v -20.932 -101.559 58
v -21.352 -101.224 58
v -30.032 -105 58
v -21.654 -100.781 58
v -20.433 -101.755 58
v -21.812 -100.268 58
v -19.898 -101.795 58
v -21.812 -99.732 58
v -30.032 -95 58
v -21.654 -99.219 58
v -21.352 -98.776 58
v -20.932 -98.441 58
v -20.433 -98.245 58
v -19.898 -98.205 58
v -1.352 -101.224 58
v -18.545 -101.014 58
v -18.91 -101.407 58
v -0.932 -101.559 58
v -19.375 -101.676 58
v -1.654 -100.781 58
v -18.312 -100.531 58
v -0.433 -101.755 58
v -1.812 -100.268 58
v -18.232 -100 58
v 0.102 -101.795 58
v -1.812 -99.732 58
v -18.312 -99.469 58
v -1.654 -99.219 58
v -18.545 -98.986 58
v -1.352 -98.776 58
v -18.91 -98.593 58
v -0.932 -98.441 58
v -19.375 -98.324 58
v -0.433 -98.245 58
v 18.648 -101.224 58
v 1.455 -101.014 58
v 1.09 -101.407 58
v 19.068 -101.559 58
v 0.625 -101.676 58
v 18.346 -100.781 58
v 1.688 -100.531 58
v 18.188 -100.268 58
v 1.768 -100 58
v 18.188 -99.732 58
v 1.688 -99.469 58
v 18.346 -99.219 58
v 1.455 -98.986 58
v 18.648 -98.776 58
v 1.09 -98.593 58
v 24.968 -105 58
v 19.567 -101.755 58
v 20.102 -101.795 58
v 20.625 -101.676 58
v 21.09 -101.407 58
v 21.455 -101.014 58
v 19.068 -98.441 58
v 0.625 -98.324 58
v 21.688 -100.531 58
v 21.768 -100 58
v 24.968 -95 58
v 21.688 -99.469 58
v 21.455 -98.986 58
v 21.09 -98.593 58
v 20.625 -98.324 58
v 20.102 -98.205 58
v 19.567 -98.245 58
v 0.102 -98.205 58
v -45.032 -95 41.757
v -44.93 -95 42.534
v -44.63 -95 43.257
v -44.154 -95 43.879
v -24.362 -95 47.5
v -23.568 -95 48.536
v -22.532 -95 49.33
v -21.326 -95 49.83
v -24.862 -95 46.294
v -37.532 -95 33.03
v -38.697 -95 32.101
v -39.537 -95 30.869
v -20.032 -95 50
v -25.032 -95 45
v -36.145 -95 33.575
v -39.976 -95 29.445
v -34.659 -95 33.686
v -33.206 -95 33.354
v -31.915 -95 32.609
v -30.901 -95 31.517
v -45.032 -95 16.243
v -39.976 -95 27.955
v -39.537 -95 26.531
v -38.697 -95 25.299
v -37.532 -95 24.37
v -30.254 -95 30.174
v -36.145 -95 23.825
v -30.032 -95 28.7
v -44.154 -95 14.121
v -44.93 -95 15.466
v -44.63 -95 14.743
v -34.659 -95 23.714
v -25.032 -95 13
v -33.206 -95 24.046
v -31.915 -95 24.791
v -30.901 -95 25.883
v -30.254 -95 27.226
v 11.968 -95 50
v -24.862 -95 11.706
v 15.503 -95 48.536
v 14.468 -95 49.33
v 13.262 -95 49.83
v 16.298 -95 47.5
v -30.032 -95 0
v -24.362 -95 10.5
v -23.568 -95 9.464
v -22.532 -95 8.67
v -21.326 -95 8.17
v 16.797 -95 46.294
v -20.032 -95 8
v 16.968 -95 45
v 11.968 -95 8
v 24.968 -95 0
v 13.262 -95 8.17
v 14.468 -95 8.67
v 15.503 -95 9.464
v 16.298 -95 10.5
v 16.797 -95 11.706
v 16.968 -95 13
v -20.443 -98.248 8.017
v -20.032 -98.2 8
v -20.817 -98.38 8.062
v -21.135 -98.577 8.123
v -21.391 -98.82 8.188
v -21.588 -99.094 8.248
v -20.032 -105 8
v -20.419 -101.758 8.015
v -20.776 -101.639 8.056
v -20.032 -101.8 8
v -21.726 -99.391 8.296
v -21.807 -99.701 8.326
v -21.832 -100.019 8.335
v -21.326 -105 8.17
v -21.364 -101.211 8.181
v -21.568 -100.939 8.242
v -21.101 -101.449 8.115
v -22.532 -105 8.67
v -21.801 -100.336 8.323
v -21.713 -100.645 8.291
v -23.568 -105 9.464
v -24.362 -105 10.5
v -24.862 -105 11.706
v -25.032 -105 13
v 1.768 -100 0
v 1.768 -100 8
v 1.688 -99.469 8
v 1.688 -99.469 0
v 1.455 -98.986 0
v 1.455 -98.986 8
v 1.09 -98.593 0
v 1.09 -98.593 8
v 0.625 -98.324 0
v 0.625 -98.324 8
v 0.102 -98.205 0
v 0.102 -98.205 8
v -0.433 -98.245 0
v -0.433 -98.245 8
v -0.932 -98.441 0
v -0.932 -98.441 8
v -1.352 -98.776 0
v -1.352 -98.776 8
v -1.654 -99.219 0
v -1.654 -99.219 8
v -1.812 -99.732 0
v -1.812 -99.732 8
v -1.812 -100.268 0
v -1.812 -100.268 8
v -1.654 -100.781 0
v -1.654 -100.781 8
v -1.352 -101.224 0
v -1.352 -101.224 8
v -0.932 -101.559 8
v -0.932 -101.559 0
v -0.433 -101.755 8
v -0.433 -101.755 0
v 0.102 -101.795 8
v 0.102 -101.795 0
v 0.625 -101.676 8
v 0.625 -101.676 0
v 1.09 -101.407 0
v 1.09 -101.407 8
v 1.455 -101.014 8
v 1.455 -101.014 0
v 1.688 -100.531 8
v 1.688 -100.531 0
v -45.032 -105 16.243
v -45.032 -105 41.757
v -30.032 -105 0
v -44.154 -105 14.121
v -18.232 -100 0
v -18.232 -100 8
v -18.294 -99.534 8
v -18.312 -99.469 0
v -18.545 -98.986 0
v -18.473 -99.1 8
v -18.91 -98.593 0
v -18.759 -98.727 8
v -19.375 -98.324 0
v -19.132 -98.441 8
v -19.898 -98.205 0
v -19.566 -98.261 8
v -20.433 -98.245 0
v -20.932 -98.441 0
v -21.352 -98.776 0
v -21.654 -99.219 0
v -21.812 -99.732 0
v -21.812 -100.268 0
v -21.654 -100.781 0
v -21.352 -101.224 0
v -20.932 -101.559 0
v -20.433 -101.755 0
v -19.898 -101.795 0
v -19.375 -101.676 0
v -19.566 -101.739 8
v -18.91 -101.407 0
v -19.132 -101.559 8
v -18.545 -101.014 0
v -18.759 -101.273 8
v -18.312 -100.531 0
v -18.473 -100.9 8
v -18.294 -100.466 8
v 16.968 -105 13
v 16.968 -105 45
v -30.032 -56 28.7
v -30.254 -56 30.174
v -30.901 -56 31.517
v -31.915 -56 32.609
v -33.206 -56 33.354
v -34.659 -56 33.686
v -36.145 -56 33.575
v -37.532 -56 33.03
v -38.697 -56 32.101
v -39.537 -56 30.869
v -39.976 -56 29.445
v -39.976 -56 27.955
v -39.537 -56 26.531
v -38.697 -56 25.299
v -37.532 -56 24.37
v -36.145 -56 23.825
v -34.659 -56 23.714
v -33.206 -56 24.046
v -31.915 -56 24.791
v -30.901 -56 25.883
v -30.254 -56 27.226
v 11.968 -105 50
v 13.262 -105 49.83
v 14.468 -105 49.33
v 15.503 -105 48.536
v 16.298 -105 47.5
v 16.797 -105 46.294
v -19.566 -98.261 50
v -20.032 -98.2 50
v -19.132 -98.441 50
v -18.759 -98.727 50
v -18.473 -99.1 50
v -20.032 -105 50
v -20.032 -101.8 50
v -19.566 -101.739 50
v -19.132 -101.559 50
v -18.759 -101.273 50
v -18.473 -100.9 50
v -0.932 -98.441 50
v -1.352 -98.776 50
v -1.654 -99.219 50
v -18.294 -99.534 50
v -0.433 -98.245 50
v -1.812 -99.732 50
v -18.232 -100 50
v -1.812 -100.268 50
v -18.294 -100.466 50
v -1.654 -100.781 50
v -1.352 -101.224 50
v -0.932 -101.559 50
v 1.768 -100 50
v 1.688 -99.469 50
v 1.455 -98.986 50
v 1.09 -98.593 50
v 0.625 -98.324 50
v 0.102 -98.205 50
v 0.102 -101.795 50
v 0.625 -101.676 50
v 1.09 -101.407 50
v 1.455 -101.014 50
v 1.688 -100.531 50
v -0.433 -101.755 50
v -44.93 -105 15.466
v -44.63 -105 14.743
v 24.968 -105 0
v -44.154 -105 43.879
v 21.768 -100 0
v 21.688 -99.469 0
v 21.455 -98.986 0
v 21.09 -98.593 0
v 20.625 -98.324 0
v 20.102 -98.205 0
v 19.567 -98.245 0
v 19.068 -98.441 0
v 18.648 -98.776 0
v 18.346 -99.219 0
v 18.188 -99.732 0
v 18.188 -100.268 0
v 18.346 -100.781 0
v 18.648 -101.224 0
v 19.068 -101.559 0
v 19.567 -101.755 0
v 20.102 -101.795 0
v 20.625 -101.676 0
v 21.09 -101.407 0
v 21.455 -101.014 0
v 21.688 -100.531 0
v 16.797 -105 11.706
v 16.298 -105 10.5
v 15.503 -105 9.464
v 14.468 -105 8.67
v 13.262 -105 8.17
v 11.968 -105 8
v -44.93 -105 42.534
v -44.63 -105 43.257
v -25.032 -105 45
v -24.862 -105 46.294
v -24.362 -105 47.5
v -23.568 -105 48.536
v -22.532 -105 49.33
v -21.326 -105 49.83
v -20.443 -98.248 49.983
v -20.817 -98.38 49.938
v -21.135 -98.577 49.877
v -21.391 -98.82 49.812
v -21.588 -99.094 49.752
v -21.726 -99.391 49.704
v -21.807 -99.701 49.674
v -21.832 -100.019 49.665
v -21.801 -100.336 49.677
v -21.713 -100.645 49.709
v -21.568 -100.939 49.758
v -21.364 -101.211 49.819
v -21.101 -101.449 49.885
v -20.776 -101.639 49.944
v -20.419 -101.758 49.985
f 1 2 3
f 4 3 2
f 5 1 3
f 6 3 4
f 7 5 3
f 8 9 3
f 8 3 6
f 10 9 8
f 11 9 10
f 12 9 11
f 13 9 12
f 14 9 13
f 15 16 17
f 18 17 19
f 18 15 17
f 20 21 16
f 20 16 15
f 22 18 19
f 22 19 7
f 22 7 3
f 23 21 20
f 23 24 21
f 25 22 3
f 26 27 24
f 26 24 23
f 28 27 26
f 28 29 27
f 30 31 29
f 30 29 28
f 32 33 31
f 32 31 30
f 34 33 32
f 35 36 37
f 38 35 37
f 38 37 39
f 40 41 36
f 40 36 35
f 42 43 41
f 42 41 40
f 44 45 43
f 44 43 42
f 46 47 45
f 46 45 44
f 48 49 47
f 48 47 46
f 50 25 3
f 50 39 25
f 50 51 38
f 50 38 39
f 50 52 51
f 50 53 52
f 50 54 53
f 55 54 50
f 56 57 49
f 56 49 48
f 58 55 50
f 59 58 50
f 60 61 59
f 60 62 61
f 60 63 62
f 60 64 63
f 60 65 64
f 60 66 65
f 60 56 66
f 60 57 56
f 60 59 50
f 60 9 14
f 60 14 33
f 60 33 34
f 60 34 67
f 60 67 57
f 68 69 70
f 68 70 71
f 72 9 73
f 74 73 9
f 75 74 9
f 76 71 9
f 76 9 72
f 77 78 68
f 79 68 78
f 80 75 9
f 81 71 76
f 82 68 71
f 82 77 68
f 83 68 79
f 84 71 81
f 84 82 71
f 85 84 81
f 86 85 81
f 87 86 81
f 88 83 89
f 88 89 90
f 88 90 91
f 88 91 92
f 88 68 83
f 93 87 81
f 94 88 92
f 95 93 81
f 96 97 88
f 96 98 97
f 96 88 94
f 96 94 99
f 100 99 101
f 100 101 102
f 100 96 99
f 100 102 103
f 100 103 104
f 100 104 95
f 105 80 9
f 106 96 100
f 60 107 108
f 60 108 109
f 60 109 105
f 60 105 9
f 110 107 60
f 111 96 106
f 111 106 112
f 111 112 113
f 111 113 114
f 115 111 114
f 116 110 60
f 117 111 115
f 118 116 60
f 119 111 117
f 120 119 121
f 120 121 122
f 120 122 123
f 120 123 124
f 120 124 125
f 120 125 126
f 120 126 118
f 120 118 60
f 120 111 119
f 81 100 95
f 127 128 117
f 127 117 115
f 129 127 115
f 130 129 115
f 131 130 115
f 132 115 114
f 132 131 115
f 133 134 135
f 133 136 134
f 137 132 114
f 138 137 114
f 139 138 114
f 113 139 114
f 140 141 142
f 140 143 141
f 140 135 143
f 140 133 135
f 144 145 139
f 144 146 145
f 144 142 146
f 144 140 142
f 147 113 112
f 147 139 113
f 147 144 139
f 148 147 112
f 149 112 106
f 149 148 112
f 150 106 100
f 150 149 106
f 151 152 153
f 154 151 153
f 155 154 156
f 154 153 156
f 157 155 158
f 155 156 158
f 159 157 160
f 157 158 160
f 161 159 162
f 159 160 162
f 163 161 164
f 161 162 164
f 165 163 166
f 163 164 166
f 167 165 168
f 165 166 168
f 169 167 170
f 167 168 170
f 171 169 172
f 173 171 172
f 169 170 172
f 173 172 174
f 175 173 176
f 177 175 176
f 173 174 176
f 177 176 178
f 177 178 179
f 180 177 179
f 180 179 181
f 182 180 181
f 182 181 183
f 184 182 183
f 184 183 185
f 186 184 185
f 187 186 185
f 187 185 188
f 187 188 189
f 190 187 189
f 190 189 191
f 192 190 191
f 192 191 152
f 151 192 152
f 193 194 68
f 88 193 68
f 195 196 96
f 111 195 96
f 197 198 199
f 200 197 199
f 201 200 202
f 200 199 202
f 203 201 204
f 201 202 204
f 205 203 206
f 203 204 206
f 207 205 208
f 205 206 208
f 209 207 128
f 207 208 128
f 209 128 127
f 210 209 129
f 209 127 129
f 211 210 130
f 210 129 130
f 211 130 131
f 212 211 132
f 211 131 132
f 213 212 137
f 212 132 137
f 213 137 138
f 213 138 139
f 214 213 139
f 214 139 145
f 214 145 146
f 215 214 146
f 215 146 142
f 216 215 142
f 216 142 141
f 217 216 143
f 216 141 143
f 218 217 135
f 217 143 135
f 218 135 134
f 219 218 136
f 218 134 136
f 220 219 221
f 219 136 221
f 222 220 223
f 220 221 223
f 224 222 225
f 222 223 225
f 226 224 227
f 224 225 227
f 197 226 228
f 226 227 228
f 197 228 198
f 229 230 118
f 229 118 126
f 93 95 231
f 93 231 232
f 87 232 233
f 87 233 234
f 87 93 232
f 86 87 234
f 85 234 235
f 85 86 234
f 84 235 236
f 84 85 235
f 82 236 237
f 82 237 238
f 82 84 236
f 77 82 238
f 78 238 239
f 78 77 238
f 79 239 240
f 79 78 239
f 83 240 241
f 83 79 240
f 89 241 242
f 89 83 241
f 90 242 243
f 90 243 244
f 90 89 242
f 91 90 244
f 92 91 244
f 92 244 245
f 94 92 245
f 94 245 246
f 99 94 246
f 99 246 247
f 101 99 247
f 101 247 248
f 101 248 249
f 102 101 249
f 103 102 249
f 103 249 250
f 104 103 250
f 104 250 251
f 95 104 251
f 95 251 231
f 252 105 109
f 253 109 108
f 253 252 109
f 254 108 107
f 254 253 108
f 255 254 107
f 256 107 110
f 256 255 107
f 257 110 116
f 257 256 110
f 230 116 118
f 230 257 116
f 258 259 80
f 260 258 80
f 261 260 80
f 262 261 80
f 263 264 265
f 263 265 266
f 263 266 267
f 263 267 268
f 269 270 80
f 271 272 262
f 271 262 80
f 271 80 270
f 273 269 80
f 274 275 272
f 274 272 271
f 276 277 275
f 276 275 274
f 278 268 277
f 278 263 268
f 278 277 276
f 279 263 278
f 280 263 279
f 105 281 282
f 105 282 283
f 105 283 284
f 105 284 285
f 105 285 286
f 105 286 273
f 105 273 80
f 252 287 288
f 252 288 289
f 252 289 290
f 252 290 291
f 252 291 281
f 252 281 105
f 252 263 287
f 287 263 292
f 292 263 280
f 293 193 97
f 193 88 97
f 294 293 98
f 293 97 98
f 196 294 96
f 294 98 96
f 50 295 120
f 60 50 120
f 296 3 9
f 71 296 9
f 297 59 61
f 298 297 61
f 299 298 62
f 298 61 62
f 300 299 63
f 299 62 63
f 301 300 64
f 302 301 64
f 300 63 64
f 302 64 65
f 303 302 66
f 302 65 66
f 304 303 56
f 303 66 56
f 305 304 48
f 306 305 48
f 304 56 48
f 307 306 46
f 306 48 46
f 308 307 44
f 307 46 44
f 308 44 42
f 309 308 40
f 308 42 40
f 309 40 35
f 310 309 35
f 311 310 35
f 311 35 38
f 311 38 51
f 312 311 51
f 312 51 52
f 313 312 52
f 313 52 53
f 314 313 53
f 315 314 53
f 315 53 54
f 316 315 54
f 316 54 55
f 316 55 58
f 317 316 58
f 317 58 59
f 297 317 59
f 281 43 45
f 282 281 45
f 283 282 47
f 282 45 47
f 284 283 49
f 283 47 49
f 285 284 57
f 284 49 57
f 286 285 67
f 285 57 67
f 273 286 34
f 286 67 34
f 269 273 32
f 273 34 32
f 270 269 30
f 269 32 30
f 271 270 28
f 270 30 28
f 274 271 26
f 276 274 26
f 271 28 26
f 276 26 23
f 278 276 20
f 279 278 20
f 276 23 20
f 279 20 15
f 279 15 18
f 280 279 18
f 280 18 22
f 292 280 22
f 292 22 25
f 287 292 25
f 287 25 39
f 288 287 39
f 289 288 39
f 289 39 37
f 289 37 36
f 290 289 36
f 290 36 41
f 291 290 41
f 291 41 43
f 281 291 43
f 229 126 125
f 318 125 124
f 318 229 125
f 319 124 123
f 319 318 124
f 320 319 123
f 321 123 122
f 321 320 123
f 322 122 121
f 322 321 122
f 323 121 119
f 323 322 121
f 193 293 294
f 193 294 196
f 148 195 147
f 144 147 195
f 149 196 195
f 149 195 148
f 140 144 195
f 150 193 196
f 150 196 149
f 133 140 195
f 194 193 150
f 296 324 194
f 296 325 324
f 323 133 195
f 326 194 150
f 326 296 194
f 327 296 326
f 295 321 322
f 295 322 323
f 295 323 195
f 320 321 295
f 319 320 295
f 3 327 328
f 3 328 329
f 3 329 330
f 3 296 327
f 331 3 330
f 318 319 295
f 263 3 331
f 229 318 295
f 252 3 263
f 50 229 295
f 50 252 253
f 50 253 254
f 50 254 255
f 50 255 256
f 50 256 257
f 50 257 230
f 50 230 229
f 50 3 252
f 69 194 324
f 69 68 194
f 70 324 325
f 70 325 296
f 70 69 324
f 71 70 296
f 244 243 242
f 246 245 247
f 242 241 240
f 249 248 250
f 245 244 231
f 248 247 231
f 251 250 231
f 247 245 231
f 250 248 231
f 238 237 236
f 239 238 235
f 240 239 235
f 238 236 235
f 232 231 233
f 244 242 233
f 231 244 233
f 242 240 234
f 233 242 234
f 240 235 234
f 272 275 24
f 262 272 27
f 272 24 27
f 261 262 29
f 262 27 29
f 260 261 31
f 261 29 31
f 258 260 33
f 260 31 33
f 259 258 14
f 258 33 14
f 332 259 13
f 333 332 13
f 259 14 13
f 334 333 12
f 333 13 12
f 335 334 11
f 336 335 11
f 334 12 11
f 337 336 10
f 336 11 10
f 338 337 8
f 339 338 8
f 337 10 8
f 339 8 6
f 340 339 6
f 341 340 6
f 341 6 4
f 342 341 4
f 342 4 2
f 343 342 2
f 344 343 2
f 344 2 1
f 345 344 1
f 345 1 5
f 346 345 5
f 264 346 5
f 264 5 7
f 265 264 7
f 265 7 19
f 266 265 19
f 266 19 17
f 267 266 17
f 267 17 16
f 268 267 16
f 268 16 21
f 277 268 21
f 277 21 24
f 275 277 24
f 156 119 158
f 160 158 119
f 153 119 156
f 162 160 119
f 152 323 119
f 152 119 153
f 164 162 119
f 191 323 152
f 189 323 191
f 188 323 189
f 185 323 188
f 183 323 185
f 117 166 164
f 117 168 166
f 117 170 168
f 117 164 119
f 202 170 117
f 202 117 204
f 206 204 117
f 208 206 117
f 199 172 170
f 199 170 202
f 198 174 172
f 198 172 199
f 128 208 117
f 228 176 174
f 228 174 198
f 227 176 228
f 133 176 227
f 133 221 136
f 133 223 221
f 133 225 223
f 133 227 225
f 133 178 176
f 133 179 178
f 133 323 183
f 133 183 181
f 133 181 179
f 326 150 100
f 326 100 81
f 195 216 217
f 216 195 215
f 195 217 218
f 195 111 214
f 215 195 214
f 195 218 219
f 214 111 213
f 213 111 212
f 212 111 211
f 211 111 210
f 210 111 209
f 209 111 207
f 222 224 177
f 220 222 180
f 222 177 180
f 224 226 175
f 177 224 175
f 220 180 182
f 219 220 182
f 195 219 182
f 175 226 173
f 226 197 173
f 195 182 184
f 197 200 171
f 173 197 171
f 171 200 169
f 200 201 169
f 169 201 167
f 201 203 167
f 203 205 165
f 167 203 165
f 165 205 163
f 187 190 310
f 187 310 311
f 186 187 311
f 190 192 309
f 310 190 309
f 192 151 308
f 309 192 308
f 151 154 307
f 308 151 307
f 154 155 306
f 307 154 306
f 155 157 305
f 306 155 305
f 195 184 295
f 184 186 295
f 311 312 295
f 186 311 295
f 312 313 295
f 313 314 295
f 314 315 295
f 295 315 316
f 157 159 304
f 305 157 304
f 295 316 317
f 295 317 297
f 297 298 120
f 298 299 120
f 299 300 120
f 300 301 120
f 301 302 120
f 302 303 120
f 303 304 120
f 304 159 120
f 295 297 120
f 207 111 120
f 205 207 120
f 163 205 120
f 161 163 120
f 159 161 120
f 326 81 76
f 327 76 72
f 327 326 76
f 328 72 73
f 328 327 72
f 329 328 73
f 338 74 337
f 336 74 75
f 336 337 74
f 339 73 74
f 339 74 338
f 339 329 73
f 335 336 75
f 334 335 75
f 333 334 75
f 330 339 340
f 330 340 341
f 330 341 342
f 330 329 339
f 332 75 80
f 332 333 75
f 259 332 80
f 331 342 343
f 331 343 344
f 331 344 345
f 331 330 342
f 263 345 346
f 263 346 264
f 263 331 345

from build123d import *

# Parameters (mm, degrees)
SKETCH1_W          = 70
SKETCH1_H          = 10
EXTRUDE1_DEPTH     = 58
SKETCH2_R          = 5
EXTRUDE2_DEPTH     = 49
CUT_EXTRUDE1_DEPTH = 30
CHAMFER1_SIZE      = 15
FILLET1_R          = 3
SKETCH4_R          = 1.8
CUT_EXTRUDE2_DEPTH = 60


with BuildPart() as part:
    # Sketch1 → Extrude1 (new body)
    with BuildSketch(Plane.XY):
        with Locations((-10.032216865, -100)):
            Rectangle(SKETCH1_W, SKETCH1_H)
    extrude(amount=EXTRUDE1_DEPTH)

    # Sketch2 → Extrude2 (add)
    with BuildSketch(Plane.XZ.offset(105)):
        with Locations((-35.032216865, 28.7)):
            Circle(SKETCH2_R)
    extrude(amount=-EXTRUDE2_DEPTH)

    # Sketch3 → Cut-Extrude1 (cut)
    with BuildSketch(Plane.XZ.offset(105)):
        with BuildLine():
            Line((-20.032216865, 50), (11.967783135, 50))
            ThreePointArc((11.967783135, 50), (15.503317041, 48.535533906), (16.967783135, 45))
            Line((16.967783135, 45), (16.967783135, 13))
            ThreePointArc((16.967783135, 13), (15.503317041, 9.464466094), (11.967783135, 8))
            Line((11.967783135, 8), (-20.032216865, 8))
            ThreePointArc((-20.032216865, 8), (-23.567750771, 9.464466094), (-25.032216865, 13))
            Line((-25.032216865, 13), (-25.032216865, 45))
            ThreePointArc((-25.032216865, 45), (-23.567750771, 48.535533906), (-20.032216865, 50))
        make_face()
    extrude(amount=-CUT_EXTRUDE1_DEPTH, mode=Mode.SUBTRACT)

    # Chamfer1
    chamfer1_edges = [part.edges().sort_by_distance(p)[0] for p in [
        (-45.032216865, -100, 58),
        (-45.032216865, -100, 0),
    ]]
    chamfer(chamfer1_edges, length=CHAMFER1_SIZE)

    # Fillet1
    fillet1_edges = [part.edges().sort_by_distance(p)[0] for p in [
        (-45.032216865, -100, 43),
        (-45.032216865, -100, 15),
    ]]
    fillet(fillet1_edges, radius=FILLET1_R)

    # Sketch4 → Cut-Extrude2 (cut)
    with BuildSketch(Plane.XY.offset(58)):
        with Locations((-20.032216865, -100)):
            Circle(SKETCH4_R)
        with Locations((-0.032216865, -100)):
            Circle(SKETCH4_R)
        with Locations((19.967783135, -100)):
            Circle(SKETCH4_R)
    extrude(amount=-CUT_EXTRUDE2_DEPTH, mode=Mode.SUBTRACT)


solid = part.part
